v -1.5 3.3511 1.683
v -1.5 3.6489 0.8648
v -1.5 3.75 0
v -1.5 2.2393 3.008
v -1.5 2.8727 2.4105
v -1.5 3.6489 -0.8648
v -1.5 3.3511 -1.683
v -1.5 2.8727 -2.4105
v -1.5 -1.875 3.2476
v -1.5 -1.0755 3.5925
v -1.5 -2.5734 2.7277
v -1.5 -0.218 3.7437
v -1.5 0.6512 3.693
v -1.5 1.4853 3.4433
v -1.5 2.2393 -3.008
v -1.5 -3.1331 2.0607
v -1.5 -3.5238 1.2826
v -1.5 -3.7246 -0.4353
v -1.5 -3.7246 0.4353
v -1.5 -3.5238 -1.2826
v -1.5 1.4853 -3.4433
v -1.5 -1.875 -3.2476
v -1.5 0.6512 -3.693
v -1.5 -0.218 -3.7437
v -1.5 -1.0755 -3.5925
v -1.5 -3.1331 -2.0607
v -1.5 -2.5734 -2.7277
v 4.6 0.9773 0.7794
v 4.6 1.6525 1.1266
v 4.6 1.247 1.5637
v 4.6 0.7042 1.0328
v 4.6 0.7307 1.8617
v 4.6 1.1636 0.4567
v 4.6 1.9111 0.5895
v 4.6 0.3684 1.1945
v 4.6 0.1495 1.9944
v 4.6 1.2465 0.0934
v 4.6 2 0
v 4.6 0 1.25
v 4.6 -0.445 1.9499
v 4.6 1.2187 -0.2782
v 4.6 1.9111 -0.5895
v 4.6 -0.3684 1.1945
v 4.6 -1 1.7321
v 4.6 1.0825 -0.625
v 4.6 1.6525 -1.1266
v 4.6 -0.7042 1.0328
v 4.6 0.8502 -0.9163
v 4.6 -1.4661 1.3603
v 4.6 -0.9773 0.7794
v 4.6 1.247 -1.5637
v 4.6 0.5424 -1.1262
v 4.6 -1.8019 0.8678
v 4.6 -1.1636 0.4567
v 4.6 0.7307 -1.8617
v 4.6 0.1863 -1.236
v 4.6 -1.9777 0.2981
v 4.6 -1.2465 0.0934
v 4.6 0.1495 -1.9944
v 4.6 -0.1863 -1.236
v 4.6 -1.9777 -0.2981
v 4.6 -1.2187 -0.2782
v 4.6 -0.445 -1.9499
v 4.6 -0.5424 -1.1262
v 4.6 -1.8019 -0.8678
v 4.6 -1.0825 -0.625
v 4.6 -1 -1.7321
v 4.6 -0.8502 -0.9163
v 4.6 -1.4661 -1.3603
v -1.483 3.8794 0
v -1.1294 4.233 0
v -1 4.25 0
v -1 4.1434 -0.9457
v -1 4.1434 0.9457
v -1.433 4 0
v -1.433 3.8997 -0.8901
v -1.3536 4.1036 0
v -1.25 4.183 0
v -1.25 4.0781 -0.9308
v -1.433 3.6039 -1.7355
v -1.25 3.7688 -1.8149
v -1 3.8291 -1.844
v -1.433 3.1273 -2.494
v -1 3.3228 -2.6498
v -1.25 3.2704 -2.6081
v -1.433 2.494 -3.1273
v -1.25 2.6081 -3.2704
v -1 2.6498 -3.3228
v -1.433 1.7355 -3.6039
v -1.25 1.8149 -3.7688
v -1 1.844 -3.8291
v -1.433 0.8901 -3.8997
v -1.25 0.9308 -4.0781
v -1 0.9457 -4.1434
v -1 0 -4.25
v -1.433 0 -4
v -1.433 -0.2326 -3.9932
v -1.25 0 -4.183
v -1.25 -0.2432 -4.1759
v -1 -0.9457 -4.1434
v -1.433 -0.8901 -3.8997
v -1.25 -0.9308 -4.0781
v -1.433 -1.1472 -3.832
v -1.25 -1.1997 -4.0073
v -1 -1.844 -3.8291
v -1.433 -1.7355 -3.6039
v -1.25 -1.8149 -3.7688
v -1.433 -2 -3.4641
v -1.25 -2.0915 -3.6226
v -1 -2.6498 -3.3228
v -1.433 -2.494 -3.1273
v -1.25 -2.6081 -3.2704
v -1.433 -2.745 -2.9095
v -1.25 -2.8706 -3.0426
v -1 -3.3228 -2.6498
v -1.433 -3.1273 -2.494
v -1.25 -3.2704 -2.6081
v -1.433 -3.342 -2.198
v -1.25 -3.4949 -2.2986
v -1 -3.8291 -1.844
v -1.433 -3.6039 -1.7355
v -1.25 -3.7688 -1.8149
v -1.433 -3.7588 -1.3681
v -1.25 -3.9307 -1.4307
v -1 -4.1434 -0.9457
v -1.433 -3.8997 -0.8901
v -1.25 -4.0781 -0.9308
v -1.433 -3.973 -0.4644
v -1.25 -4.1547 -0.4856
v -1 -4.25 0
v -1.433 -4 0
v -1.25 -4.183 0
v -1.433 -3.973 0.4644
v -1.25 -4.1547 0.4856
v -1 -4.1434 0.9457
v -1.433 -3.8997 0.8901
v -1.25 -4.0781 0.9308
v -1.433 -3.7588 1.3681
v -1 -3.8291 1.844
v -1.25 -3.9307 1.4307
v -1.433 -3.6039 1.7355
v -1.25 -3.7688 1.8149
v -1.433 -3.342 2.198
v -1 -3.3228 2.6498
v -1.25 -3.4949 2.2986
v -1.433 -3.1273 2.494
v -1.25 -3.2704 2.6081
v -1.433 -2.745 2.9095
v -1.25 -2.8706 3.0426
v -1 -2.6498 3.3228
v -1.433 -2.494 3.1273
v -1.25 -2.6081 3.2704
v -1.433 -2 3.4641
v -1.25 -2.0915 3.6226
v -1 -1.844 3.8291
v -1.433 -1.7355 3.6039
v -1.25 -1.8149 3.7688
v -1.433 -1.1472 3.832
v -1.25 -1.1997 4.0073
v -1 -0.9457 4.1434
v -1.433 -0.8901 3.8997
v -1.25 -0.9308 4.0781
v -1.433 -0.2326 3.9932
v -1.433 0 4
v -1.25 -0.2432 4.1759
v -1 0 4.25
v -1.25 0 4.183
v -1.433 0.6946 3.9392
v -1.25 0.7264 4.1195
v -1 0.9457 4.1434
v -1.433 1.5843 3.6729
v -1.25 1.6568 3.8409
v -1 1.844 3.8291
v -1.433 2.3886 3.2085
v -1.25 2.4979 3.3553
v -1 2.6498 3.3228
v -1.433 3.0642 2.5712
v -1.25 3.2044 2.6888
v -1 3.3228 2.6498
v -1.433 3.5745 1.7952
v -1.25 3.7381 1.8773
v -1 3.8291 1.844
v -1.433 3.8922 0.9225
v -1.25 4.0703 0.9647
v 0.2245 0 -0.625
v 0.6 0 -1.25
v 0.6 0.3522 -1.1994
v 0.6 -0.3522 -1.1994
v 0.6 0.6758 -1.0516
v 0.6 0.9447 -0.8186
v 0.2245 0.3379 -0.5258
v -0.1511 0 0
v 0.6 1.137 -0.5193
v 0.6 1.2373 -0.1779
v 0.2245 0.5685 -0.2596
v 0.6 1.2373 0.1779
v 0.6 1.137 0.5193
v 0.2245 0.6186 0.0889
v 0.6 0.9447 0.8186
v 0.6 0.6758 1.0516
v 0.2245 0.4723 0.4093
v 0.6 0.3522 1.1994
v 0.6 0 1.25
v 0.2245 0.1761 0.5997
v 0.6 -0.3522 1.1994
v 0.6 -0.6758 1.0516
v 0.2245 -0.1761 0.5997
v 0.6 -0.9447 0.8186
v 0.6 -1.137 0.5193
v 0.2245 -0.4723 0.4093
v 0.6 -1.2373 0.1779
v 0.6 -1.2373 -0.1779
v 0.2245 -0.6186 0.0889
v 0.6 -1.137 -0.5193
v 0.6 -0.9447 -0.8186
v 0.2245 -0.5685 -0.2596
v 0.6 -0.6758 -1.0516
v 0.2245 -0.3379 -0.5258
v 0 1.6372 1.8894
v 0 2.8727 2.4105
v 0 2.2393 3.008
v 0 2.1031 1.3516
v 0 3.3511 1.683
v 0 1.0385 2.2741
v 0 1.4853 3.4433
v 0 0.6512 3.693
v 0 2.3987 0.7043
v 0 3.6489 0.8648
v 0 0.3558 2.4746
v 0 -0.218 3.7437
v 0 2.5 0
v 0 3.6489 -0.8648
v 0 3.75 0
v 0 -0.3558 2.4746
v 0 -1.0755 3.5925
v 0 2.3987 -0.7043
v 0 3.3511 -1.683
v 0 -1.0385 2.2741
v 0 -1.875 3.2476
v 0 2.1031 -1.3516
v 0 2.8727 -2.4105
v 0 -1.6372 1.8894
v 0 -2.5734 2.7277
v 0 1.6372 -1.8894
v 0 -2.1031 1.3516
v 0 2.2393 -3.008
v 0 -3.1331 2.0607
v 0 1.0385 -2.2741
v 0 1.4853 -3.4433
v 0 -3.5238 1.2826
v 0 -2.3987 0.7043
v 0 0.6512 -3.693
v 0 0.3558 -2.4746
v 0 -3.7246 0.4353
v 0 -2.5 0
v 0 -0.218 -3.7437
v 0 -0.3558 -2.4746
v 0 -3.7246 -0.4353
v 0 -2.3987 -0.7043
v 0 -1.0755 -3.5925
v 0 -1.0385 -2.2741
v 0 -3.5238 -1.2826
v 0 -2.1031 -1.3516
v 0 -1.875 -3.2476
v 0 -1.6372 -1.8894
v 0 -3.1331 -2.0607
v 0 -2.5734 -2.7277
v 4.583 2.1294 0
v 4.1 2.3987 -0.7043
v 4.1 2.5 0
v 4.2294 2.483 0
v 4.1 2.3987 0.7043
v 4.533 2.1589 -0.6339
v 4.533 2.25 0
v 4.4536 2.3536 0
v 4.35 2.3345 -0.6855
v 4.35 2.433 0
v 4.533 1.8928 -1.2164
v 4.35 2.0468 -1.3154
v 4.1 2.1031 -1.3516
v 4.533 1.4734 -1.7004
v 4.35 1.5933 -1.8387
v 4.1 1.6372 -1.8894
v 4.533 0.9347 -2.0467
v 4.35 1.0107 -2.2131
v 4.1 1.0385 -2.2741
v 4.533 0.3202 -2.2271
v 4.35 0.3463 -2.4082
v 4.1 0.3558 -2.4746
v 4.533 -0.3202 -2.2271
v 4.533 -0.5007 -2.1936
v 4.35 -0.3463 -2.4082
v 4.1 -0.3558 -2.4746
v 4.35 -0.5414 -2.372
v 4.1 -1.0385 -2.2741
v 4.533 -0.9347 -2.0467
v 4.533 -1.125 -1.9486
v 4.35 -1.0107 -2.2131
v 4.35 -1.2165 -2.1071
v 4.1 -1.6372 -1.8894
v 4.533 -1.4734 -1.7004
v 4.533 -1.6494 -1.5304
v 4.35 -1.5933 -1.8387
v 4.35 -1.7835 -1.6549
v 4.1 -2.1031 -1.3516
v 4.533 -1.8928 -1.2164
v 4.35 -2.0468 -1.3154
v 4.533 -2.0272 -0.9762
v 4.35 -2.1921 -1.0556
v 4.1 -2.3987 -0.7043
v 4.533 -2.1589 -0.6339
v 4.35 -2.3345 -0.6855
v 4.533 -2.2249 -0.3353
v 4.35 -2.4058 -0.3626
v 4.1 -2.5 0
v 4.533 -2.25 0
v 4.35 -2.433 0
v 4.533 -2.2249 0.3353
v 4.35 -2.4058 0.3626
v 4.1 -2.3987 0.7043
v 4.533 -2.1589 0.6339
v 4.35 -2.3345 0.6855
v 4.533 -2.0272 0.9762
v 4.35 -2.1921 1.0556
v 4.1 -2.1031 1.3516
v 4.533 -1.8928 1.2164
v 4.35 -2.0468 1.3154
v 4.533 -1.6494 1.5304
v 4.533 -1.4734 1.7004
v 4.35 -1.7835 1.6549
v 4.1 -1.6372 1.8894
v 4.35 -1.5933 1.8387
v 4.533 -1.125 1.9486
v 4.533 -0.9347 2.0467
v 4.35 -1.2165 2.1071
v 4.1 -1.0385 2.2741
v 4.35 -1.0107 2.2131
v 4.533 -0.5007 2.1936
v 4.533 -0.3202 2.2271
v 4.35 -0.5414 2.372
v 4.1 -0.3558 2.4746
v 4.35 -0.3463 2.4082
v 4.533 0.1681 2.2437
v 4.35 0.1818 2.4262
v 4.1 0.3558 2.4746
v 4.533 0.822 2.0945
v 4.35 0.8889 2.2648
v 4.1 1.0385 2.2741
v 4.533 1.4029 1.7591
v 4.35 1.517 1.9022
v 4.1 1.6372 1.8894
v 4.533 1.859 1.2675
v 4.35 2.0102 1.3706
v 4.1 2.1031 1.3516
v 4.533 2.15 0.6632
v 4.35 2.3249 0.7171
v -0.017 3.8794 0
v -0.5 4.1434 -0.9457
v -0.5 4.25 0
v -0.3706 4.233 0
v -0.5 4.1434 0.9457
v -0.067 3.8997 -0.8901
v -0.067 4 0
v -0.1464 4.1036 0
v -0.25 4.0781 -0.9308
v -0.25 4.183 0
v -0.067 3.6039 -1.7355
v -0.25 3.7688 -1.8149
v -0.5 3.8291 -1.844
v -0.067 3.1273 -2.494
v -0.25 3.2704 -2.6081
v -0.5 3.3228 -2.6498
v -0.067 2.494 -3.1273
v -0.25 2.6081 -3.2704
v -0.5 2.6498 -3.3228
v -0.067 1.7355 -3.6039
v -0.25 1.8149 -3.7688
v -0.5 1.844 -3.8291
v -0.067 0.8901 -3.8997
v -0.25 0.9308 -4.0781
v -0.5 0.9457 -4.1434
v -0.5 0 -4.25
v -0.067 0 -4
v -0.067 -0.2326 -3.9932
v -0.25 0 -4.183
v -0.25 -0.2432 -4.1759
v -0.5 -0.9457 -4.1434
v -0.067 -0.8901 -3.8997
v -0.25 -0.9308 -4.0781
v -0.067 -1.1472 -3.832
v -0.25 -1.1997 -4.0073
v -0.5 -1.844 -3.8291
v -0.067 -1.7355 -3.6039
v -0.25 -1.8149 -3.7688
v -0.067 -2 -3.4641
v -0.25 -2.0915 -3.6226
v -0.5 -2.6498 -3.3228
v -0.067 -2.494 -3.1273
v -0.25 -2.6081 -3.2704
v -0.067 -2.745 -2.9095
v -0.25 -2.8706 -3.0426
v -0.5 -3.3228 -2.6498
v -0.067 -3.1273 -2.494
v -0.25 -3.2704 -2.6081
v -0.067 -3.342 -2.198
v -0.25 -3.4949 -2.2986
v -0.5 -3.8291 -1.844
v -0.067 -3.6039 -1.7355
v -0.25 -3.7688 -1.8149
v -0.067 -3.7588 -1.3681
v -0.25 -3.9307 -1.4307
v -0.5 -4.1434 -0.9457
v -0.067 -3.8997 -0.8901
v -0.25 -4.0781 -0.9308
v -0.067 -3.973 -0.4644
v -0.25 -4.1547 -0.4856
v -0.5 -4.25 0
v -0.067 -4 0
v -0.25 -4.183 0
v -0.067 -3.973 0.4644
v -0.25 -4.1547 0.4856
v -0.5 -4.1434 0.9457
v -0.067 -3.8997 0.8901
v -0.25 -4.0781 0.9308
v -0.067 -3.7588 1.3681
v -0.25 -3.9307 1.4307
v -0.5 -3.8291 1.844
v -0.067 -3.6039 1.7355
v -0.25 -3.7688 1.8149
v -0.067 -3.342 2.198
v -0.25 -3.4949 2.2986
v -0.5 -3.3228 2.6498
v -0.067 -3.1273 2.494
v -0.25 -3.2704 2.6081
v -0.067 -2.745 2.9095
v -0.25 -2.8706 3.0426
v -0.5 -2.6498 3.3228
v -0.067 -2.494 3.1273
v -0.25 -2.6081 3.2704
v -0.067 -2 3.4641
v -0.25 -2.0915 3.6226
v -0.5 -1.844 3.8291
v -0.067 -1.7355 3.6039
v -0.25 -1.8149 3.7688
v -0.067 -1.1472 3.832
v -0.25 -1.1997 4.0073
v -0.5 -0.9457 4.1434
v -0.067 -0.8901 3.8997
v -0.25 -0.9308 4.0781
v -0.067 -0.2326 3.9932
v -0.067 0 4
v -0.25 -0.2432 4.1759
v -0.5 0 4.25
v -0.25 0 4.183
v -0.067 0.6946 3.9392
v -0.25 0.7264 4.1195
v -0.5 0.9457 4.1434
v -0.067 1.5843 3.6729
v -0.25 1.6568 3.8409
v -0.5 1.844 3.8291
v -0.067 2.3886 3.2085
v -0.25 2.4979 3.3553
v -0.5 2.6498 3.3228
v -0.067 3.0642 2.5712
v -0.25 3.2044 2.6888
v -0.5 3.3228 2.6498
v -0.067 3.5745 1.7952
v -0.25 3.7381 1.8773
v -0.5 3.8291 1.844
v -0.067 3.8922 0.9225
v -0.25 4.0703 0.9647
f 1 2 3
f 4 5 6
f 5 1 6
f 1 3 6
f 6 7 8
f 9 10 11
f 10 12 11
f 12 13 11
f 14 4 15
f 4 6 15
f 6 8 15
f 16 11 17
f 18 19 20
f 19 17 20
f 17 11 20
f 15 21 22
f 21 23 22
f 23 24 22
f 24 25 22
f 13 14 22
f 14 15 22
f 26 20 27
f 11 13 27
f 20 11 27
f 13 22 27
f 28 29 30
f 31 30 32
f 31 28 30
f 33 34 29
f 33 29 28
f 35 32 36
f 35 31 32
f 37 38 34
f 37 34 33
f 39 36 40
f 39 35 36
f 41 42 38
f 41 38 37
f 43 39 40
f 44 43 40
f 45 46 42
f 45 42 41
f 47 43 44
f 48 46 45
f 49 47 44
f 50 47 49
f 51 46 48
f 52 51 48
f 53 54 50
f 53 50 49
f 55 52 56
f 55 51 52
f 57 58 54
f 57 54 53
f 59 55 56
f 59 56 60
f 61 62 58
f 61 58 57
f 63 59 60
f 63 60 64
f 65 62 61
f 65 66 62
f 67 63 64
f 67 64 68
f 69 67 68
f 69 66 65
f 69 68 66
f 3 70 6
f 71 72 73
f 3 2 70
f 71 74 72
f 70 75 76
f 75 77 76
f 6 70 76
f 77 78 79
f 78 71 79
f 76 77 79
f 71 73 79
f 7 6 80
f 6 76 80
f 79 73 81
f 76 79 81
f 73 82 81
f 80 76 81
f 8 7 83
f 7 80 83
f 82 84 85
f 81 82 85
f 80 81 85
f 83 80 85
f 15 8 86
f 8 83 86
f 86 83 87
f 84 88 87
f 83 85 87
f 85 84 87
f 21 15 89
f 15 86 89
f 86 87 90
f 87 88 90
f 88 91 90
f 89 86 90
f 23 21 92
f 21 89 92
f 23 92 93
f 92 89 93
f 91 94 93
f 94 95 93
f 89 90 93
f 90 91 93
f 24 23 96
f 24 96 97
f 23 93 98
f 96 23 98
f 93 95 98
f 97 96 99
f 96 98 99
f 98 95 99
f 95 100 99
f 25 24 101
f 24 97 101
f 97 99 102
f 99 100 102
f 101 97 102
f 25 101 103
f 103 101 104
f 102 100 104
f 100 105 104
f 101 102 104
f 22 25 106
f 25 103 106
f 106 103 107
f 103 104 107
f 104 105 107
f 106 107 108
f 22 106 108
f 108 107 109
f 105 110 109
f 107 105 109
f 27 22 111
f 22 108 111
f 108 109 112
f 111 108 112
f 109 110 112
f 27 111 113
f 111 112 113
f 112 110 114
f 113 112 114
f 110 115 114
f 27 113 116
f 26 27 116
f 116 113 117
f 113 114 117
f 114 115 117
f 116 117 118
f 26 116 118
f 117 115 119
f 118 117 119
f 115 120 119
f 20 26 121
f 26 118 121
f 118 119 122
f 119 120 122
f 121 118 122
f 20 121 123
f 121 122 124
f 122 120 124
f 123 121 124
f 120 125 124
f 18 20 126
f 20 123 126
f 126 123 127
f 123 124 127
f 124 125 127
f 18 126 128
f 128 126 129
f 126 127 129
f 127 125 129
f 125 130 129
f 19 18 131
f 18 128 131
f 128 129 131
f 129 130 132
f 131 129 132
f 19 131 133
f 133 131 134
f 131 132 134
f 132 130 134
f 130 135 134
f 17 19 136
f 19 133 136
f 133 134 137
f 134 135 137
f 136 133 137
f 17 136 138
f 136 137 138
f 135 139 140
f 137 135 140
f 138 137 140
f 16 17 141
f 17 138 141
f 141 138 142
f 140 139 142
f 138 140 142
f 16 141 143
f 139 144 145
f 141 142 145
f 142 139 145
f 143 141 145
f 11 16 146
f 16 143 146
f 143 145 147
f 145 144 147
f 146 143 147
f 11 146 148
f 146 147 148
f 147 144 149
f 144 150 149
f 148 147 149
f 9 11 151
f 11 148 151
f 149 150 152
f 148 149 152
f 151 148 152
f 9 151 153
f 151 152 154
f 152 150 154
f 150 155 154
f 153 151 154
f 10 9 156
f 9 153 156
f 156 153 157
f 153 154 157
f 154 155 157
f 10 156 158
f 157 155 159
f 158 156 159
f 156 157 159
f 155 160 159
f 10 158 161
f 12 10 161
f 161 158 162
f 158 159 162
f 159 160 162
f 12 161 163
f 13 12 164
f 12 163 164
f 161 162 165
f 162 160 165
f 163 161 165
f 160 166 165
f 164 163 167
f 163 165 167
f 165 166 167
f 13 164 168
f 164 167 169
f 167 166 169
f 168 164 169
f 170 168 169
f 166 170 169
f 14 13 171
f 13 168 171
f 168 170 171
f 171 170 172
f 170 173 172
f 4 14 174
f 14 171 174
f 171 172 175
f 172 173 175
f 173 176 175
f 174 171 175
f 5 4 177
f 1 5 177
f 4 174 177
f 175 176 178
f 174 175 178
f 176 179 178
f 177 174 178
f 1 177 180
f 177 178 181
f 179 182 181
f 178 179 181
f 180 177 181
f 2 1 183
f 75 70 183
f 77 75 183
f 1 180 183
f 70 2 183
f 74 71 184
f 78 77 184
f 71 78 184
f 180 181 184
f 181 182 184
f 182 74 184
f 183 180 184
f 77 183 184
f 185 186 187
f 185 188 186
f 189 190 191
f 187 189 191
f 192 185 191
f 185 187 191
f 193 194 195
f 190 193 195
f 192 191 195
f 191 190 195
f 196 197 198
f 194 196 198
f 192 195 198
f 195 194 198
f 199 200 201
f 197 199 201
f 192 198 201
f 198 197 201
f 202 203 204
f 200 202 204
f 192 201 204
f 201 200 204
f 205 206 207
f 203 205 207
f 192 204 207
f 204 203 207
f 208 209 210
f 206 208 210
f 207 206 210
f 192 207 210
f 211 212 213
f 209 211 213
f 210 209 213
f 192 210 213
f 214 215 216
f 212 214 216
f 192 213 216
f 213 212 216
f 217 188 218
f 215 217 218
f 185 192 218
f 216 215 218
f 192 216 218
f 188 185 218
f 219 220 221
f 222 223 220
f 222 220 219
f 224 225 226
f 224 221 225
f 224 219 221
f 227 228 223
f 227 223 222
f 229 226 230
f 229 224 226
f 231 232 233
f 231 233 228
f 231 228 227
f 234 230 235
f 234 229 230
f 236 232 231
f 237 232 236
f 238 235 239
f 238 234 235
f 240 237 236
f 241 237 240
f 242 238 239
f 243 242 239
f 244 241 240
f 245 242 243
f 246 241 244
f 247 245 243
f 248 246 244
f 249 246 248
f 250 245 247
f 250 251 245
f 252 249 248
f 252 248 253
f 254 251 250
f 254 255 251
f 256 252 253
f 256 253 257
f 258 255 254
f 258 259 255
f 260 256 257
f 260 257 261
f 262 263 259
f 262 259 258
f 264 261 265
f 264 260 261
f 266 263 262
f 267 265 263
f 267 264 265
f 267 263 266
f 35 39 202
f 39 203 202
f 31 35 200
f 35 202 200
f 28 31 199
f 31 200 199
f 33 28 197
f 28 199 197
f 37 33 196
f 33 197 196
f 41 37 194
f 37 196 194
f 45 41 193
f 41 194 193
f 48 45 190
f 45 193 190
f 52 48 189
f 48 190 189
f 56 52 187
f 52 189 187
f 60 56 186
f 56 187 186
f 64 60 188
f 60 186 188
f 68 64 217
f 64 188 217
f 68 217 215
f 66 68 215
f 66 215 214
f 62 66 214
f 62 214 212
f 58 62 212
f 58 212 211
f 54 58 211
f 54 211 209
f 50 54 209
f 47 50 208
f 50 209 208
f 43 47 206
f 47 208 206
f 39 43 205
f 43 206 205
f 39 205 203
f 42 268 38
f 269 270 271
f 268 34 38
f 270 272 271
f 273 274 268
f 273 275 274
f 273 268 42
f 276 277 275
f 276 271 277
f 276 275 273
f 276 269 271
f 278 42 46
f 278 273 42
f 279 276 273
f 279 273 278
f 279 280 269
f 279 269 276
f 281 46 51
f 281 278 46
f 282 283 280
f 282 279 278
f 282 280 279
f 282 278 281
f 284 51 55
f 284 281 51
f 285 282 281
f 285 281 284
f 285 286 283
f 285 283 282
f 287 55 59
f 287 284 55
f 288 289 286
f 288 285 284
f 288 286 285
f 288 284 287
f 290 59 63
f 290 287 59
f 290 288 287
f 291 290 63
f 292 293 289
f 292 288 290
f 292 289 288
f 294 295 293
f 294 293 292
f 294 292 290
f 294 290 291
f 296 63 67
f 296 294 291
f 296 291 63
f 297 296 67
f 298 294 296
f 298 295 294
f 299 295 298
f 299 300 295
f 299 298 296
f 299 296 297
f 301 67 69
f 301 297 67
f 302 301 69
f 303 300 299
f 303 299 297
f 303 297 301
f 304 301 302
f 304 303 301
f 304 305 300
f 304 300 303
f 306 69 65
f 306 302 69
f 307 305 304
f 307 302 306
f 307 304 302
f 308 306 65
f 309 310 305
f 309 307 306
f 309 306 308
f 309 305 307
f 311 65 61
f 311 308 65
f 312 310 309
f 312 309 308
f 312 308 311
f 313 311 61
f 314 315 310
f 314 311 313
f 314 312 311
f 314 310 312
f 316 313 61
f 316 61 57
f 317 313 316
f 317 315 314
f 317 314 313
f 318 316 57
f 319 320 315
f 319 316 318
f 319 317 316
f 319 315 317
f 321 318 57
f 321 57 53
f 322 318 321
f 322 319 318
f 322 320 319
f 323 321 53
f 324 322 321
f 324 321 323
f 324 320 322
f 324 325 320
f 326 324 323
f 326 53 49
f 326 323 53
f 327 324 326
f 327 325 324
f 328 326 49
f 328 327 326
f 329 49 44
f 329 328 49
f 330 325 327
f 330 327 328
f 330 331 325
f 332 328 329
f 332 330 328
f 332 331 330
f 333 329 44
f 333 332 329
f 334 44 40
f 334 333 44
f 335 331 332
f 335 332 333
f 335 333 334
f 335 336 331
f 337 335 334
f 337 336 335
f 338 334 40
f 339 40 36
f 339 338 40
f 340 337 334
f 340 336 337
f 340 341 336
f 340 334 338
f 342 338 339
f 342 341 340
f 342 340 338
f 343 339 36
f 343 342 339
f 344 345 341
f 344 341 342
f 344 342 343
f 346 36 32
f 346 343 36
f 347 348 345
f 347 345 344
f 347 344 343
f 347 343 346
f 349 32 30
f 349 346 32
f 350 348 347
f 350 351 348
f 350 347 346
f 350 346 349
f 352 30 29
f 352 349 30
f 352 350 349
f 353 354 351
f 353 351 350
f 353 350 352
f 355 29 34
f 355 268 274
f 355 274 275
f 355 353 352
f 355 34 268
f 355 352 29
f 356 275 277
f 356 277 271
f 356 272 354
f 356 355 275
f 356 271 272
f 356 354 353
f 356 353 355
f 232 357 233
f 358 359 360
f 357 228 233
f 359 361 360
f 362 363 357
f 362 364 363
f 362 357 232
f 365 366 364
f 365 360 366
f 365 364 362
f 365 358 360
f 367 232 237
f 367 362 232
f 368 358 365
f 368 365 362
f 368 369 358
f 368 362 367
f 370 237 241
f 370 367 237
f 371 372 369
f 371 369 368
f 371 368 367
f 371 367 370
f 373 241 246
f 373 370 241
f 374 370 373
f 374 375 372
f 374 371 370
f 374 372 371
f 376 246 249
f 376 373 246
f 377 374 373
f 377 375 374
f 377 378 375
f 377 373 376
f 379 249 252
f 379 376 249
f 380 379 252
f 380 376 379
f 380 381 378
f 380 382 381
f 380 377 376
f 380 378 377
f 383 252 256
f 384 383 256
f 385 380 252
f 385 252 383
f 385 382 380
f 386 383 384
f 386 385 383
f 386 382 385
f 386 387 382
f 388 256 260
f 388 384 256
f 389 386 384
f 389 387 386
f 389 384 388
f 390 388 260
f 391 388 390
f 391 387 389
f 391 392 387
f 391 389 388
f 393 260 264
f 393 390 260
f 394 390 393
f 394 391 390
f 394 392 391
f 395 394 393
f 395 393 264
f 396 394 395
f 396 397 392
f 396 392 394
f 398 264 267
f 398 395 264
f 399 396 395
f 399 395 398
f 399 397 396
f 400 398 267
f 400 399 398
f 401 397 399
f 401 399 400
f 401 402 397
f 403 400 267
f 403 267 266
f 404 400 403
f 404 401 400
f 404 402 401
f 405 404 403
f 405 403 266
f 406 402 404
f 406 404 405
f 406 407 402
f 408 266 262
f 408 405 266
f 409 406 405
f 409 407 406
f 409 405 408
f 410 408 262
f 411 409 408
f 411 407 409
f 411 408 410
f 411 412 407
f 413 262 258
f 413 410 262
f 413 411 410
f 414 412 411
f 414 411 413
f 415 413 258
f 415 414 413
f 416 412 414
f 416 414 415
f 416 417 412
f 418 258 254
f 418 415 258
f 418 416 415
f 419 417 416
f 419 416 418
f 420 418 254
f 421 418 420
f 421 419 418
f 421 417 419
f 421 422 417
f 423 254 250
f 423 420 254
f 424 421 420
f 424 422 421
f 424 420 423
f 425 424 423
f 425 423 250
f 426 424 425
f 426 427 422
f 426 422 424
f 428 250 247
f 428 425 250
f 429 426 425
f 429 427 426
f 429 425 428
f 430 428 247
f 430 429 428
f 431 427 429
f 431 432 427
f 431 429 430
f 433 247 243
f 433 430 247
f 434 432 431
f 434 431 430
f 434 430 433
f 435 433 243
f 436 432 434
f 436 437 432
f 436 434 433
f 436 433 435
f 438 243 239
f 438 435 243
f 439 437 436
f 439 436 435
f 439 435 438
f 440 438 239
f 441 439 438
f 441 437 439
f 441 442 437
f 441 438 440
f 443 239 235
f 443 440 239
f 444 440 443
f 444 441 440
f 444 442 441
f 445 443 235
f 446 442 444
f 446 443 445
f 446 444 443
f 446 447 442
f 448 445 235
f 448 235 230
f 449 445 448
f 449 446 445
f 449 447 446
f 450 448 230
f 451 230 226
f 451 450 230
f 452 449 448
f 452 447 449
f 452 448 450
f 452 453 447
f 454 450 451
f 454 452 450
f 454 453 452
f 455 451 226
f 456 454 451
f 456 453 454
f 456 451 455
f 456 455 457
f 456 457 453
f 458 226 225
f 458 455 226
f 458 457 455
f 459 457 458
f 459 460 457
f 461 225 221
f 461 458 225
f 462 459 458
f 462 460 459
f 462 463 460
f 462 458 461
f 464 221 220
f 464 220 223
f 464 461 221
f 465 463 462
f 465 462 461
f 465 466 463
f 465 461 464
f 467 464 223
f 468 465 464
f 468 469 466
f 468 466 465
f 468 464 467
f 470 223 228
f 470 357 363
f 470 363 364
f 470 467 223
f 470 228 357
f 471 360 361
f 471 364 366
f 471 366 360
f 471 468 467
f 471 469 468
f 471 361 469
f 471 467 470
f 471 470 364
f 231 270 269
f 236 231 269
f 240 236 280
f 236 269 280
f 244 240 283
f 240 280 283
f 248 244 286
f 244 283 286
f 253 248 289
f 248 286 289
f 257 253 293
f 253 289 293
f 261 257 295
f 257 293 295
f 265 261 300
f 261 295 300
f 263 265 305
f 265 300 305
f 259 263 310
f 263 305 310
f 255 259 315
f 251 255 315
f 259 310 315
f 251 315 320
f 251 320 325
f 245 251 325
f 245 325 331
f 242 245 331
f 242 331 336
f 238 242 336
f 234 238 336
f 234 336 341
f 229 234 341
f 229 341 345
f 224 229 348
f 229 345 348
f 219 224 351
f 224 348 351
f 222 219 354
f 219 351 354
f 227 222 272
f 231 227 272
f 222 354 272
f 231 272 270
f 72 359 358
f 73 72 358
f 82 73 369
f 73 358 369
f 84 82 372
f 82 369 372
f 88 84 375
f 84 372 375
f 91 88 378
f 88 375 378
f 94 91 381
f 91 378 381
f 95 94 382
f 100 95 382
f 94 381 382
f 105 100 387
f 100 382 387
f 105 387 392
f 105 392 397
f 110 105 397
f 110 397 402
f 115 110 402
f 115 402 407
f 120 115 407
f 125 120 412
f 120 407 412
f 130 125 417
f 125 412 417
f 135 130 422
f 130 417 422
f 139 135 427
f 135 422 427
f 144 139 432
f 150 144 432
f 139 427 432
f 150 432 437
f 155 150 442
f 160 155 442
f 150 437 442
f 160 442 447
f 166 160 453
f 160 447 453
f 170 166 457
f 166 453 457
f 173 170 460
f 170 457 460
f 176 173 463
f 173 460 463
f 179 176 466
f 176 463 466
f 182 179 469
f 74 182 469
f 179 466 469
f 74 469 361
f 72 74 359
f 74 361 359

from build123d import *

# Parameters (mm, degrees)
SKETCH_1_W             = 1.5
SKETCH_1_H             = 4.25
SKETCH_1_W_2           = 4.6
SKETCH_1_H_2           = 2.5
FILLET_1_R             = 0.5
HOLE_WIZARD_M3_1_D     = 2.5
HOLE_WIZARD_M3_1_DEPTH = 4
HOLE_WIZARD_M3_1_TIP   = 0.751075774


with BuildPart() as part:
    # 草图1 → 旋转1 (revolve)
    with BuildSketch(Plane.XY):
        with Locations((-0.75, 2.125)):
            Rectangle(SKETCH_1_W, SKETCH_1_H)
        with Locations((2.3, 1.25)):
            Rectangle(SKETCH_1_W_2, SKETCH_1_H_2)
    revolve(axis=Axis((0, 0, 0), (-1, 0, 0)))

    # 圆角1
    fillet_1_edges = [part.edges().sort_by_distance(p)[0] for p in [
        (4.6, -2.5, 0),
        (-1.5, -4.25, 0),
        (0, -4.25, 0),
    ]]
    fillet(fillet_1_edges, radius=FILLET_1_R)

    # M3 螺纹孔1
    with Locations(Plane(origin=(4.6, 0, 0), x_dir=(0, 0, -1), z_dir=(1, 0, 0))):
        with Locations((0, 0)):
            Hole(HOLE_WIZARD_M3_1_D / 2, depth=HOLE_WIZARD_M3_1_DEPTH)
            with Locations((0, 0, -(HOLE_WIZARD_M3_1_DEPTH + HOLE_WIZARD_M3_1_TIP / 2))):  # 118° drill point
                Cone(0, HOLE_WIZARD_M3_1_D / 2, HOLE_WIZARD_M3_1_TIP, mode=Mode.SUBTRACT)


solid = part.part
